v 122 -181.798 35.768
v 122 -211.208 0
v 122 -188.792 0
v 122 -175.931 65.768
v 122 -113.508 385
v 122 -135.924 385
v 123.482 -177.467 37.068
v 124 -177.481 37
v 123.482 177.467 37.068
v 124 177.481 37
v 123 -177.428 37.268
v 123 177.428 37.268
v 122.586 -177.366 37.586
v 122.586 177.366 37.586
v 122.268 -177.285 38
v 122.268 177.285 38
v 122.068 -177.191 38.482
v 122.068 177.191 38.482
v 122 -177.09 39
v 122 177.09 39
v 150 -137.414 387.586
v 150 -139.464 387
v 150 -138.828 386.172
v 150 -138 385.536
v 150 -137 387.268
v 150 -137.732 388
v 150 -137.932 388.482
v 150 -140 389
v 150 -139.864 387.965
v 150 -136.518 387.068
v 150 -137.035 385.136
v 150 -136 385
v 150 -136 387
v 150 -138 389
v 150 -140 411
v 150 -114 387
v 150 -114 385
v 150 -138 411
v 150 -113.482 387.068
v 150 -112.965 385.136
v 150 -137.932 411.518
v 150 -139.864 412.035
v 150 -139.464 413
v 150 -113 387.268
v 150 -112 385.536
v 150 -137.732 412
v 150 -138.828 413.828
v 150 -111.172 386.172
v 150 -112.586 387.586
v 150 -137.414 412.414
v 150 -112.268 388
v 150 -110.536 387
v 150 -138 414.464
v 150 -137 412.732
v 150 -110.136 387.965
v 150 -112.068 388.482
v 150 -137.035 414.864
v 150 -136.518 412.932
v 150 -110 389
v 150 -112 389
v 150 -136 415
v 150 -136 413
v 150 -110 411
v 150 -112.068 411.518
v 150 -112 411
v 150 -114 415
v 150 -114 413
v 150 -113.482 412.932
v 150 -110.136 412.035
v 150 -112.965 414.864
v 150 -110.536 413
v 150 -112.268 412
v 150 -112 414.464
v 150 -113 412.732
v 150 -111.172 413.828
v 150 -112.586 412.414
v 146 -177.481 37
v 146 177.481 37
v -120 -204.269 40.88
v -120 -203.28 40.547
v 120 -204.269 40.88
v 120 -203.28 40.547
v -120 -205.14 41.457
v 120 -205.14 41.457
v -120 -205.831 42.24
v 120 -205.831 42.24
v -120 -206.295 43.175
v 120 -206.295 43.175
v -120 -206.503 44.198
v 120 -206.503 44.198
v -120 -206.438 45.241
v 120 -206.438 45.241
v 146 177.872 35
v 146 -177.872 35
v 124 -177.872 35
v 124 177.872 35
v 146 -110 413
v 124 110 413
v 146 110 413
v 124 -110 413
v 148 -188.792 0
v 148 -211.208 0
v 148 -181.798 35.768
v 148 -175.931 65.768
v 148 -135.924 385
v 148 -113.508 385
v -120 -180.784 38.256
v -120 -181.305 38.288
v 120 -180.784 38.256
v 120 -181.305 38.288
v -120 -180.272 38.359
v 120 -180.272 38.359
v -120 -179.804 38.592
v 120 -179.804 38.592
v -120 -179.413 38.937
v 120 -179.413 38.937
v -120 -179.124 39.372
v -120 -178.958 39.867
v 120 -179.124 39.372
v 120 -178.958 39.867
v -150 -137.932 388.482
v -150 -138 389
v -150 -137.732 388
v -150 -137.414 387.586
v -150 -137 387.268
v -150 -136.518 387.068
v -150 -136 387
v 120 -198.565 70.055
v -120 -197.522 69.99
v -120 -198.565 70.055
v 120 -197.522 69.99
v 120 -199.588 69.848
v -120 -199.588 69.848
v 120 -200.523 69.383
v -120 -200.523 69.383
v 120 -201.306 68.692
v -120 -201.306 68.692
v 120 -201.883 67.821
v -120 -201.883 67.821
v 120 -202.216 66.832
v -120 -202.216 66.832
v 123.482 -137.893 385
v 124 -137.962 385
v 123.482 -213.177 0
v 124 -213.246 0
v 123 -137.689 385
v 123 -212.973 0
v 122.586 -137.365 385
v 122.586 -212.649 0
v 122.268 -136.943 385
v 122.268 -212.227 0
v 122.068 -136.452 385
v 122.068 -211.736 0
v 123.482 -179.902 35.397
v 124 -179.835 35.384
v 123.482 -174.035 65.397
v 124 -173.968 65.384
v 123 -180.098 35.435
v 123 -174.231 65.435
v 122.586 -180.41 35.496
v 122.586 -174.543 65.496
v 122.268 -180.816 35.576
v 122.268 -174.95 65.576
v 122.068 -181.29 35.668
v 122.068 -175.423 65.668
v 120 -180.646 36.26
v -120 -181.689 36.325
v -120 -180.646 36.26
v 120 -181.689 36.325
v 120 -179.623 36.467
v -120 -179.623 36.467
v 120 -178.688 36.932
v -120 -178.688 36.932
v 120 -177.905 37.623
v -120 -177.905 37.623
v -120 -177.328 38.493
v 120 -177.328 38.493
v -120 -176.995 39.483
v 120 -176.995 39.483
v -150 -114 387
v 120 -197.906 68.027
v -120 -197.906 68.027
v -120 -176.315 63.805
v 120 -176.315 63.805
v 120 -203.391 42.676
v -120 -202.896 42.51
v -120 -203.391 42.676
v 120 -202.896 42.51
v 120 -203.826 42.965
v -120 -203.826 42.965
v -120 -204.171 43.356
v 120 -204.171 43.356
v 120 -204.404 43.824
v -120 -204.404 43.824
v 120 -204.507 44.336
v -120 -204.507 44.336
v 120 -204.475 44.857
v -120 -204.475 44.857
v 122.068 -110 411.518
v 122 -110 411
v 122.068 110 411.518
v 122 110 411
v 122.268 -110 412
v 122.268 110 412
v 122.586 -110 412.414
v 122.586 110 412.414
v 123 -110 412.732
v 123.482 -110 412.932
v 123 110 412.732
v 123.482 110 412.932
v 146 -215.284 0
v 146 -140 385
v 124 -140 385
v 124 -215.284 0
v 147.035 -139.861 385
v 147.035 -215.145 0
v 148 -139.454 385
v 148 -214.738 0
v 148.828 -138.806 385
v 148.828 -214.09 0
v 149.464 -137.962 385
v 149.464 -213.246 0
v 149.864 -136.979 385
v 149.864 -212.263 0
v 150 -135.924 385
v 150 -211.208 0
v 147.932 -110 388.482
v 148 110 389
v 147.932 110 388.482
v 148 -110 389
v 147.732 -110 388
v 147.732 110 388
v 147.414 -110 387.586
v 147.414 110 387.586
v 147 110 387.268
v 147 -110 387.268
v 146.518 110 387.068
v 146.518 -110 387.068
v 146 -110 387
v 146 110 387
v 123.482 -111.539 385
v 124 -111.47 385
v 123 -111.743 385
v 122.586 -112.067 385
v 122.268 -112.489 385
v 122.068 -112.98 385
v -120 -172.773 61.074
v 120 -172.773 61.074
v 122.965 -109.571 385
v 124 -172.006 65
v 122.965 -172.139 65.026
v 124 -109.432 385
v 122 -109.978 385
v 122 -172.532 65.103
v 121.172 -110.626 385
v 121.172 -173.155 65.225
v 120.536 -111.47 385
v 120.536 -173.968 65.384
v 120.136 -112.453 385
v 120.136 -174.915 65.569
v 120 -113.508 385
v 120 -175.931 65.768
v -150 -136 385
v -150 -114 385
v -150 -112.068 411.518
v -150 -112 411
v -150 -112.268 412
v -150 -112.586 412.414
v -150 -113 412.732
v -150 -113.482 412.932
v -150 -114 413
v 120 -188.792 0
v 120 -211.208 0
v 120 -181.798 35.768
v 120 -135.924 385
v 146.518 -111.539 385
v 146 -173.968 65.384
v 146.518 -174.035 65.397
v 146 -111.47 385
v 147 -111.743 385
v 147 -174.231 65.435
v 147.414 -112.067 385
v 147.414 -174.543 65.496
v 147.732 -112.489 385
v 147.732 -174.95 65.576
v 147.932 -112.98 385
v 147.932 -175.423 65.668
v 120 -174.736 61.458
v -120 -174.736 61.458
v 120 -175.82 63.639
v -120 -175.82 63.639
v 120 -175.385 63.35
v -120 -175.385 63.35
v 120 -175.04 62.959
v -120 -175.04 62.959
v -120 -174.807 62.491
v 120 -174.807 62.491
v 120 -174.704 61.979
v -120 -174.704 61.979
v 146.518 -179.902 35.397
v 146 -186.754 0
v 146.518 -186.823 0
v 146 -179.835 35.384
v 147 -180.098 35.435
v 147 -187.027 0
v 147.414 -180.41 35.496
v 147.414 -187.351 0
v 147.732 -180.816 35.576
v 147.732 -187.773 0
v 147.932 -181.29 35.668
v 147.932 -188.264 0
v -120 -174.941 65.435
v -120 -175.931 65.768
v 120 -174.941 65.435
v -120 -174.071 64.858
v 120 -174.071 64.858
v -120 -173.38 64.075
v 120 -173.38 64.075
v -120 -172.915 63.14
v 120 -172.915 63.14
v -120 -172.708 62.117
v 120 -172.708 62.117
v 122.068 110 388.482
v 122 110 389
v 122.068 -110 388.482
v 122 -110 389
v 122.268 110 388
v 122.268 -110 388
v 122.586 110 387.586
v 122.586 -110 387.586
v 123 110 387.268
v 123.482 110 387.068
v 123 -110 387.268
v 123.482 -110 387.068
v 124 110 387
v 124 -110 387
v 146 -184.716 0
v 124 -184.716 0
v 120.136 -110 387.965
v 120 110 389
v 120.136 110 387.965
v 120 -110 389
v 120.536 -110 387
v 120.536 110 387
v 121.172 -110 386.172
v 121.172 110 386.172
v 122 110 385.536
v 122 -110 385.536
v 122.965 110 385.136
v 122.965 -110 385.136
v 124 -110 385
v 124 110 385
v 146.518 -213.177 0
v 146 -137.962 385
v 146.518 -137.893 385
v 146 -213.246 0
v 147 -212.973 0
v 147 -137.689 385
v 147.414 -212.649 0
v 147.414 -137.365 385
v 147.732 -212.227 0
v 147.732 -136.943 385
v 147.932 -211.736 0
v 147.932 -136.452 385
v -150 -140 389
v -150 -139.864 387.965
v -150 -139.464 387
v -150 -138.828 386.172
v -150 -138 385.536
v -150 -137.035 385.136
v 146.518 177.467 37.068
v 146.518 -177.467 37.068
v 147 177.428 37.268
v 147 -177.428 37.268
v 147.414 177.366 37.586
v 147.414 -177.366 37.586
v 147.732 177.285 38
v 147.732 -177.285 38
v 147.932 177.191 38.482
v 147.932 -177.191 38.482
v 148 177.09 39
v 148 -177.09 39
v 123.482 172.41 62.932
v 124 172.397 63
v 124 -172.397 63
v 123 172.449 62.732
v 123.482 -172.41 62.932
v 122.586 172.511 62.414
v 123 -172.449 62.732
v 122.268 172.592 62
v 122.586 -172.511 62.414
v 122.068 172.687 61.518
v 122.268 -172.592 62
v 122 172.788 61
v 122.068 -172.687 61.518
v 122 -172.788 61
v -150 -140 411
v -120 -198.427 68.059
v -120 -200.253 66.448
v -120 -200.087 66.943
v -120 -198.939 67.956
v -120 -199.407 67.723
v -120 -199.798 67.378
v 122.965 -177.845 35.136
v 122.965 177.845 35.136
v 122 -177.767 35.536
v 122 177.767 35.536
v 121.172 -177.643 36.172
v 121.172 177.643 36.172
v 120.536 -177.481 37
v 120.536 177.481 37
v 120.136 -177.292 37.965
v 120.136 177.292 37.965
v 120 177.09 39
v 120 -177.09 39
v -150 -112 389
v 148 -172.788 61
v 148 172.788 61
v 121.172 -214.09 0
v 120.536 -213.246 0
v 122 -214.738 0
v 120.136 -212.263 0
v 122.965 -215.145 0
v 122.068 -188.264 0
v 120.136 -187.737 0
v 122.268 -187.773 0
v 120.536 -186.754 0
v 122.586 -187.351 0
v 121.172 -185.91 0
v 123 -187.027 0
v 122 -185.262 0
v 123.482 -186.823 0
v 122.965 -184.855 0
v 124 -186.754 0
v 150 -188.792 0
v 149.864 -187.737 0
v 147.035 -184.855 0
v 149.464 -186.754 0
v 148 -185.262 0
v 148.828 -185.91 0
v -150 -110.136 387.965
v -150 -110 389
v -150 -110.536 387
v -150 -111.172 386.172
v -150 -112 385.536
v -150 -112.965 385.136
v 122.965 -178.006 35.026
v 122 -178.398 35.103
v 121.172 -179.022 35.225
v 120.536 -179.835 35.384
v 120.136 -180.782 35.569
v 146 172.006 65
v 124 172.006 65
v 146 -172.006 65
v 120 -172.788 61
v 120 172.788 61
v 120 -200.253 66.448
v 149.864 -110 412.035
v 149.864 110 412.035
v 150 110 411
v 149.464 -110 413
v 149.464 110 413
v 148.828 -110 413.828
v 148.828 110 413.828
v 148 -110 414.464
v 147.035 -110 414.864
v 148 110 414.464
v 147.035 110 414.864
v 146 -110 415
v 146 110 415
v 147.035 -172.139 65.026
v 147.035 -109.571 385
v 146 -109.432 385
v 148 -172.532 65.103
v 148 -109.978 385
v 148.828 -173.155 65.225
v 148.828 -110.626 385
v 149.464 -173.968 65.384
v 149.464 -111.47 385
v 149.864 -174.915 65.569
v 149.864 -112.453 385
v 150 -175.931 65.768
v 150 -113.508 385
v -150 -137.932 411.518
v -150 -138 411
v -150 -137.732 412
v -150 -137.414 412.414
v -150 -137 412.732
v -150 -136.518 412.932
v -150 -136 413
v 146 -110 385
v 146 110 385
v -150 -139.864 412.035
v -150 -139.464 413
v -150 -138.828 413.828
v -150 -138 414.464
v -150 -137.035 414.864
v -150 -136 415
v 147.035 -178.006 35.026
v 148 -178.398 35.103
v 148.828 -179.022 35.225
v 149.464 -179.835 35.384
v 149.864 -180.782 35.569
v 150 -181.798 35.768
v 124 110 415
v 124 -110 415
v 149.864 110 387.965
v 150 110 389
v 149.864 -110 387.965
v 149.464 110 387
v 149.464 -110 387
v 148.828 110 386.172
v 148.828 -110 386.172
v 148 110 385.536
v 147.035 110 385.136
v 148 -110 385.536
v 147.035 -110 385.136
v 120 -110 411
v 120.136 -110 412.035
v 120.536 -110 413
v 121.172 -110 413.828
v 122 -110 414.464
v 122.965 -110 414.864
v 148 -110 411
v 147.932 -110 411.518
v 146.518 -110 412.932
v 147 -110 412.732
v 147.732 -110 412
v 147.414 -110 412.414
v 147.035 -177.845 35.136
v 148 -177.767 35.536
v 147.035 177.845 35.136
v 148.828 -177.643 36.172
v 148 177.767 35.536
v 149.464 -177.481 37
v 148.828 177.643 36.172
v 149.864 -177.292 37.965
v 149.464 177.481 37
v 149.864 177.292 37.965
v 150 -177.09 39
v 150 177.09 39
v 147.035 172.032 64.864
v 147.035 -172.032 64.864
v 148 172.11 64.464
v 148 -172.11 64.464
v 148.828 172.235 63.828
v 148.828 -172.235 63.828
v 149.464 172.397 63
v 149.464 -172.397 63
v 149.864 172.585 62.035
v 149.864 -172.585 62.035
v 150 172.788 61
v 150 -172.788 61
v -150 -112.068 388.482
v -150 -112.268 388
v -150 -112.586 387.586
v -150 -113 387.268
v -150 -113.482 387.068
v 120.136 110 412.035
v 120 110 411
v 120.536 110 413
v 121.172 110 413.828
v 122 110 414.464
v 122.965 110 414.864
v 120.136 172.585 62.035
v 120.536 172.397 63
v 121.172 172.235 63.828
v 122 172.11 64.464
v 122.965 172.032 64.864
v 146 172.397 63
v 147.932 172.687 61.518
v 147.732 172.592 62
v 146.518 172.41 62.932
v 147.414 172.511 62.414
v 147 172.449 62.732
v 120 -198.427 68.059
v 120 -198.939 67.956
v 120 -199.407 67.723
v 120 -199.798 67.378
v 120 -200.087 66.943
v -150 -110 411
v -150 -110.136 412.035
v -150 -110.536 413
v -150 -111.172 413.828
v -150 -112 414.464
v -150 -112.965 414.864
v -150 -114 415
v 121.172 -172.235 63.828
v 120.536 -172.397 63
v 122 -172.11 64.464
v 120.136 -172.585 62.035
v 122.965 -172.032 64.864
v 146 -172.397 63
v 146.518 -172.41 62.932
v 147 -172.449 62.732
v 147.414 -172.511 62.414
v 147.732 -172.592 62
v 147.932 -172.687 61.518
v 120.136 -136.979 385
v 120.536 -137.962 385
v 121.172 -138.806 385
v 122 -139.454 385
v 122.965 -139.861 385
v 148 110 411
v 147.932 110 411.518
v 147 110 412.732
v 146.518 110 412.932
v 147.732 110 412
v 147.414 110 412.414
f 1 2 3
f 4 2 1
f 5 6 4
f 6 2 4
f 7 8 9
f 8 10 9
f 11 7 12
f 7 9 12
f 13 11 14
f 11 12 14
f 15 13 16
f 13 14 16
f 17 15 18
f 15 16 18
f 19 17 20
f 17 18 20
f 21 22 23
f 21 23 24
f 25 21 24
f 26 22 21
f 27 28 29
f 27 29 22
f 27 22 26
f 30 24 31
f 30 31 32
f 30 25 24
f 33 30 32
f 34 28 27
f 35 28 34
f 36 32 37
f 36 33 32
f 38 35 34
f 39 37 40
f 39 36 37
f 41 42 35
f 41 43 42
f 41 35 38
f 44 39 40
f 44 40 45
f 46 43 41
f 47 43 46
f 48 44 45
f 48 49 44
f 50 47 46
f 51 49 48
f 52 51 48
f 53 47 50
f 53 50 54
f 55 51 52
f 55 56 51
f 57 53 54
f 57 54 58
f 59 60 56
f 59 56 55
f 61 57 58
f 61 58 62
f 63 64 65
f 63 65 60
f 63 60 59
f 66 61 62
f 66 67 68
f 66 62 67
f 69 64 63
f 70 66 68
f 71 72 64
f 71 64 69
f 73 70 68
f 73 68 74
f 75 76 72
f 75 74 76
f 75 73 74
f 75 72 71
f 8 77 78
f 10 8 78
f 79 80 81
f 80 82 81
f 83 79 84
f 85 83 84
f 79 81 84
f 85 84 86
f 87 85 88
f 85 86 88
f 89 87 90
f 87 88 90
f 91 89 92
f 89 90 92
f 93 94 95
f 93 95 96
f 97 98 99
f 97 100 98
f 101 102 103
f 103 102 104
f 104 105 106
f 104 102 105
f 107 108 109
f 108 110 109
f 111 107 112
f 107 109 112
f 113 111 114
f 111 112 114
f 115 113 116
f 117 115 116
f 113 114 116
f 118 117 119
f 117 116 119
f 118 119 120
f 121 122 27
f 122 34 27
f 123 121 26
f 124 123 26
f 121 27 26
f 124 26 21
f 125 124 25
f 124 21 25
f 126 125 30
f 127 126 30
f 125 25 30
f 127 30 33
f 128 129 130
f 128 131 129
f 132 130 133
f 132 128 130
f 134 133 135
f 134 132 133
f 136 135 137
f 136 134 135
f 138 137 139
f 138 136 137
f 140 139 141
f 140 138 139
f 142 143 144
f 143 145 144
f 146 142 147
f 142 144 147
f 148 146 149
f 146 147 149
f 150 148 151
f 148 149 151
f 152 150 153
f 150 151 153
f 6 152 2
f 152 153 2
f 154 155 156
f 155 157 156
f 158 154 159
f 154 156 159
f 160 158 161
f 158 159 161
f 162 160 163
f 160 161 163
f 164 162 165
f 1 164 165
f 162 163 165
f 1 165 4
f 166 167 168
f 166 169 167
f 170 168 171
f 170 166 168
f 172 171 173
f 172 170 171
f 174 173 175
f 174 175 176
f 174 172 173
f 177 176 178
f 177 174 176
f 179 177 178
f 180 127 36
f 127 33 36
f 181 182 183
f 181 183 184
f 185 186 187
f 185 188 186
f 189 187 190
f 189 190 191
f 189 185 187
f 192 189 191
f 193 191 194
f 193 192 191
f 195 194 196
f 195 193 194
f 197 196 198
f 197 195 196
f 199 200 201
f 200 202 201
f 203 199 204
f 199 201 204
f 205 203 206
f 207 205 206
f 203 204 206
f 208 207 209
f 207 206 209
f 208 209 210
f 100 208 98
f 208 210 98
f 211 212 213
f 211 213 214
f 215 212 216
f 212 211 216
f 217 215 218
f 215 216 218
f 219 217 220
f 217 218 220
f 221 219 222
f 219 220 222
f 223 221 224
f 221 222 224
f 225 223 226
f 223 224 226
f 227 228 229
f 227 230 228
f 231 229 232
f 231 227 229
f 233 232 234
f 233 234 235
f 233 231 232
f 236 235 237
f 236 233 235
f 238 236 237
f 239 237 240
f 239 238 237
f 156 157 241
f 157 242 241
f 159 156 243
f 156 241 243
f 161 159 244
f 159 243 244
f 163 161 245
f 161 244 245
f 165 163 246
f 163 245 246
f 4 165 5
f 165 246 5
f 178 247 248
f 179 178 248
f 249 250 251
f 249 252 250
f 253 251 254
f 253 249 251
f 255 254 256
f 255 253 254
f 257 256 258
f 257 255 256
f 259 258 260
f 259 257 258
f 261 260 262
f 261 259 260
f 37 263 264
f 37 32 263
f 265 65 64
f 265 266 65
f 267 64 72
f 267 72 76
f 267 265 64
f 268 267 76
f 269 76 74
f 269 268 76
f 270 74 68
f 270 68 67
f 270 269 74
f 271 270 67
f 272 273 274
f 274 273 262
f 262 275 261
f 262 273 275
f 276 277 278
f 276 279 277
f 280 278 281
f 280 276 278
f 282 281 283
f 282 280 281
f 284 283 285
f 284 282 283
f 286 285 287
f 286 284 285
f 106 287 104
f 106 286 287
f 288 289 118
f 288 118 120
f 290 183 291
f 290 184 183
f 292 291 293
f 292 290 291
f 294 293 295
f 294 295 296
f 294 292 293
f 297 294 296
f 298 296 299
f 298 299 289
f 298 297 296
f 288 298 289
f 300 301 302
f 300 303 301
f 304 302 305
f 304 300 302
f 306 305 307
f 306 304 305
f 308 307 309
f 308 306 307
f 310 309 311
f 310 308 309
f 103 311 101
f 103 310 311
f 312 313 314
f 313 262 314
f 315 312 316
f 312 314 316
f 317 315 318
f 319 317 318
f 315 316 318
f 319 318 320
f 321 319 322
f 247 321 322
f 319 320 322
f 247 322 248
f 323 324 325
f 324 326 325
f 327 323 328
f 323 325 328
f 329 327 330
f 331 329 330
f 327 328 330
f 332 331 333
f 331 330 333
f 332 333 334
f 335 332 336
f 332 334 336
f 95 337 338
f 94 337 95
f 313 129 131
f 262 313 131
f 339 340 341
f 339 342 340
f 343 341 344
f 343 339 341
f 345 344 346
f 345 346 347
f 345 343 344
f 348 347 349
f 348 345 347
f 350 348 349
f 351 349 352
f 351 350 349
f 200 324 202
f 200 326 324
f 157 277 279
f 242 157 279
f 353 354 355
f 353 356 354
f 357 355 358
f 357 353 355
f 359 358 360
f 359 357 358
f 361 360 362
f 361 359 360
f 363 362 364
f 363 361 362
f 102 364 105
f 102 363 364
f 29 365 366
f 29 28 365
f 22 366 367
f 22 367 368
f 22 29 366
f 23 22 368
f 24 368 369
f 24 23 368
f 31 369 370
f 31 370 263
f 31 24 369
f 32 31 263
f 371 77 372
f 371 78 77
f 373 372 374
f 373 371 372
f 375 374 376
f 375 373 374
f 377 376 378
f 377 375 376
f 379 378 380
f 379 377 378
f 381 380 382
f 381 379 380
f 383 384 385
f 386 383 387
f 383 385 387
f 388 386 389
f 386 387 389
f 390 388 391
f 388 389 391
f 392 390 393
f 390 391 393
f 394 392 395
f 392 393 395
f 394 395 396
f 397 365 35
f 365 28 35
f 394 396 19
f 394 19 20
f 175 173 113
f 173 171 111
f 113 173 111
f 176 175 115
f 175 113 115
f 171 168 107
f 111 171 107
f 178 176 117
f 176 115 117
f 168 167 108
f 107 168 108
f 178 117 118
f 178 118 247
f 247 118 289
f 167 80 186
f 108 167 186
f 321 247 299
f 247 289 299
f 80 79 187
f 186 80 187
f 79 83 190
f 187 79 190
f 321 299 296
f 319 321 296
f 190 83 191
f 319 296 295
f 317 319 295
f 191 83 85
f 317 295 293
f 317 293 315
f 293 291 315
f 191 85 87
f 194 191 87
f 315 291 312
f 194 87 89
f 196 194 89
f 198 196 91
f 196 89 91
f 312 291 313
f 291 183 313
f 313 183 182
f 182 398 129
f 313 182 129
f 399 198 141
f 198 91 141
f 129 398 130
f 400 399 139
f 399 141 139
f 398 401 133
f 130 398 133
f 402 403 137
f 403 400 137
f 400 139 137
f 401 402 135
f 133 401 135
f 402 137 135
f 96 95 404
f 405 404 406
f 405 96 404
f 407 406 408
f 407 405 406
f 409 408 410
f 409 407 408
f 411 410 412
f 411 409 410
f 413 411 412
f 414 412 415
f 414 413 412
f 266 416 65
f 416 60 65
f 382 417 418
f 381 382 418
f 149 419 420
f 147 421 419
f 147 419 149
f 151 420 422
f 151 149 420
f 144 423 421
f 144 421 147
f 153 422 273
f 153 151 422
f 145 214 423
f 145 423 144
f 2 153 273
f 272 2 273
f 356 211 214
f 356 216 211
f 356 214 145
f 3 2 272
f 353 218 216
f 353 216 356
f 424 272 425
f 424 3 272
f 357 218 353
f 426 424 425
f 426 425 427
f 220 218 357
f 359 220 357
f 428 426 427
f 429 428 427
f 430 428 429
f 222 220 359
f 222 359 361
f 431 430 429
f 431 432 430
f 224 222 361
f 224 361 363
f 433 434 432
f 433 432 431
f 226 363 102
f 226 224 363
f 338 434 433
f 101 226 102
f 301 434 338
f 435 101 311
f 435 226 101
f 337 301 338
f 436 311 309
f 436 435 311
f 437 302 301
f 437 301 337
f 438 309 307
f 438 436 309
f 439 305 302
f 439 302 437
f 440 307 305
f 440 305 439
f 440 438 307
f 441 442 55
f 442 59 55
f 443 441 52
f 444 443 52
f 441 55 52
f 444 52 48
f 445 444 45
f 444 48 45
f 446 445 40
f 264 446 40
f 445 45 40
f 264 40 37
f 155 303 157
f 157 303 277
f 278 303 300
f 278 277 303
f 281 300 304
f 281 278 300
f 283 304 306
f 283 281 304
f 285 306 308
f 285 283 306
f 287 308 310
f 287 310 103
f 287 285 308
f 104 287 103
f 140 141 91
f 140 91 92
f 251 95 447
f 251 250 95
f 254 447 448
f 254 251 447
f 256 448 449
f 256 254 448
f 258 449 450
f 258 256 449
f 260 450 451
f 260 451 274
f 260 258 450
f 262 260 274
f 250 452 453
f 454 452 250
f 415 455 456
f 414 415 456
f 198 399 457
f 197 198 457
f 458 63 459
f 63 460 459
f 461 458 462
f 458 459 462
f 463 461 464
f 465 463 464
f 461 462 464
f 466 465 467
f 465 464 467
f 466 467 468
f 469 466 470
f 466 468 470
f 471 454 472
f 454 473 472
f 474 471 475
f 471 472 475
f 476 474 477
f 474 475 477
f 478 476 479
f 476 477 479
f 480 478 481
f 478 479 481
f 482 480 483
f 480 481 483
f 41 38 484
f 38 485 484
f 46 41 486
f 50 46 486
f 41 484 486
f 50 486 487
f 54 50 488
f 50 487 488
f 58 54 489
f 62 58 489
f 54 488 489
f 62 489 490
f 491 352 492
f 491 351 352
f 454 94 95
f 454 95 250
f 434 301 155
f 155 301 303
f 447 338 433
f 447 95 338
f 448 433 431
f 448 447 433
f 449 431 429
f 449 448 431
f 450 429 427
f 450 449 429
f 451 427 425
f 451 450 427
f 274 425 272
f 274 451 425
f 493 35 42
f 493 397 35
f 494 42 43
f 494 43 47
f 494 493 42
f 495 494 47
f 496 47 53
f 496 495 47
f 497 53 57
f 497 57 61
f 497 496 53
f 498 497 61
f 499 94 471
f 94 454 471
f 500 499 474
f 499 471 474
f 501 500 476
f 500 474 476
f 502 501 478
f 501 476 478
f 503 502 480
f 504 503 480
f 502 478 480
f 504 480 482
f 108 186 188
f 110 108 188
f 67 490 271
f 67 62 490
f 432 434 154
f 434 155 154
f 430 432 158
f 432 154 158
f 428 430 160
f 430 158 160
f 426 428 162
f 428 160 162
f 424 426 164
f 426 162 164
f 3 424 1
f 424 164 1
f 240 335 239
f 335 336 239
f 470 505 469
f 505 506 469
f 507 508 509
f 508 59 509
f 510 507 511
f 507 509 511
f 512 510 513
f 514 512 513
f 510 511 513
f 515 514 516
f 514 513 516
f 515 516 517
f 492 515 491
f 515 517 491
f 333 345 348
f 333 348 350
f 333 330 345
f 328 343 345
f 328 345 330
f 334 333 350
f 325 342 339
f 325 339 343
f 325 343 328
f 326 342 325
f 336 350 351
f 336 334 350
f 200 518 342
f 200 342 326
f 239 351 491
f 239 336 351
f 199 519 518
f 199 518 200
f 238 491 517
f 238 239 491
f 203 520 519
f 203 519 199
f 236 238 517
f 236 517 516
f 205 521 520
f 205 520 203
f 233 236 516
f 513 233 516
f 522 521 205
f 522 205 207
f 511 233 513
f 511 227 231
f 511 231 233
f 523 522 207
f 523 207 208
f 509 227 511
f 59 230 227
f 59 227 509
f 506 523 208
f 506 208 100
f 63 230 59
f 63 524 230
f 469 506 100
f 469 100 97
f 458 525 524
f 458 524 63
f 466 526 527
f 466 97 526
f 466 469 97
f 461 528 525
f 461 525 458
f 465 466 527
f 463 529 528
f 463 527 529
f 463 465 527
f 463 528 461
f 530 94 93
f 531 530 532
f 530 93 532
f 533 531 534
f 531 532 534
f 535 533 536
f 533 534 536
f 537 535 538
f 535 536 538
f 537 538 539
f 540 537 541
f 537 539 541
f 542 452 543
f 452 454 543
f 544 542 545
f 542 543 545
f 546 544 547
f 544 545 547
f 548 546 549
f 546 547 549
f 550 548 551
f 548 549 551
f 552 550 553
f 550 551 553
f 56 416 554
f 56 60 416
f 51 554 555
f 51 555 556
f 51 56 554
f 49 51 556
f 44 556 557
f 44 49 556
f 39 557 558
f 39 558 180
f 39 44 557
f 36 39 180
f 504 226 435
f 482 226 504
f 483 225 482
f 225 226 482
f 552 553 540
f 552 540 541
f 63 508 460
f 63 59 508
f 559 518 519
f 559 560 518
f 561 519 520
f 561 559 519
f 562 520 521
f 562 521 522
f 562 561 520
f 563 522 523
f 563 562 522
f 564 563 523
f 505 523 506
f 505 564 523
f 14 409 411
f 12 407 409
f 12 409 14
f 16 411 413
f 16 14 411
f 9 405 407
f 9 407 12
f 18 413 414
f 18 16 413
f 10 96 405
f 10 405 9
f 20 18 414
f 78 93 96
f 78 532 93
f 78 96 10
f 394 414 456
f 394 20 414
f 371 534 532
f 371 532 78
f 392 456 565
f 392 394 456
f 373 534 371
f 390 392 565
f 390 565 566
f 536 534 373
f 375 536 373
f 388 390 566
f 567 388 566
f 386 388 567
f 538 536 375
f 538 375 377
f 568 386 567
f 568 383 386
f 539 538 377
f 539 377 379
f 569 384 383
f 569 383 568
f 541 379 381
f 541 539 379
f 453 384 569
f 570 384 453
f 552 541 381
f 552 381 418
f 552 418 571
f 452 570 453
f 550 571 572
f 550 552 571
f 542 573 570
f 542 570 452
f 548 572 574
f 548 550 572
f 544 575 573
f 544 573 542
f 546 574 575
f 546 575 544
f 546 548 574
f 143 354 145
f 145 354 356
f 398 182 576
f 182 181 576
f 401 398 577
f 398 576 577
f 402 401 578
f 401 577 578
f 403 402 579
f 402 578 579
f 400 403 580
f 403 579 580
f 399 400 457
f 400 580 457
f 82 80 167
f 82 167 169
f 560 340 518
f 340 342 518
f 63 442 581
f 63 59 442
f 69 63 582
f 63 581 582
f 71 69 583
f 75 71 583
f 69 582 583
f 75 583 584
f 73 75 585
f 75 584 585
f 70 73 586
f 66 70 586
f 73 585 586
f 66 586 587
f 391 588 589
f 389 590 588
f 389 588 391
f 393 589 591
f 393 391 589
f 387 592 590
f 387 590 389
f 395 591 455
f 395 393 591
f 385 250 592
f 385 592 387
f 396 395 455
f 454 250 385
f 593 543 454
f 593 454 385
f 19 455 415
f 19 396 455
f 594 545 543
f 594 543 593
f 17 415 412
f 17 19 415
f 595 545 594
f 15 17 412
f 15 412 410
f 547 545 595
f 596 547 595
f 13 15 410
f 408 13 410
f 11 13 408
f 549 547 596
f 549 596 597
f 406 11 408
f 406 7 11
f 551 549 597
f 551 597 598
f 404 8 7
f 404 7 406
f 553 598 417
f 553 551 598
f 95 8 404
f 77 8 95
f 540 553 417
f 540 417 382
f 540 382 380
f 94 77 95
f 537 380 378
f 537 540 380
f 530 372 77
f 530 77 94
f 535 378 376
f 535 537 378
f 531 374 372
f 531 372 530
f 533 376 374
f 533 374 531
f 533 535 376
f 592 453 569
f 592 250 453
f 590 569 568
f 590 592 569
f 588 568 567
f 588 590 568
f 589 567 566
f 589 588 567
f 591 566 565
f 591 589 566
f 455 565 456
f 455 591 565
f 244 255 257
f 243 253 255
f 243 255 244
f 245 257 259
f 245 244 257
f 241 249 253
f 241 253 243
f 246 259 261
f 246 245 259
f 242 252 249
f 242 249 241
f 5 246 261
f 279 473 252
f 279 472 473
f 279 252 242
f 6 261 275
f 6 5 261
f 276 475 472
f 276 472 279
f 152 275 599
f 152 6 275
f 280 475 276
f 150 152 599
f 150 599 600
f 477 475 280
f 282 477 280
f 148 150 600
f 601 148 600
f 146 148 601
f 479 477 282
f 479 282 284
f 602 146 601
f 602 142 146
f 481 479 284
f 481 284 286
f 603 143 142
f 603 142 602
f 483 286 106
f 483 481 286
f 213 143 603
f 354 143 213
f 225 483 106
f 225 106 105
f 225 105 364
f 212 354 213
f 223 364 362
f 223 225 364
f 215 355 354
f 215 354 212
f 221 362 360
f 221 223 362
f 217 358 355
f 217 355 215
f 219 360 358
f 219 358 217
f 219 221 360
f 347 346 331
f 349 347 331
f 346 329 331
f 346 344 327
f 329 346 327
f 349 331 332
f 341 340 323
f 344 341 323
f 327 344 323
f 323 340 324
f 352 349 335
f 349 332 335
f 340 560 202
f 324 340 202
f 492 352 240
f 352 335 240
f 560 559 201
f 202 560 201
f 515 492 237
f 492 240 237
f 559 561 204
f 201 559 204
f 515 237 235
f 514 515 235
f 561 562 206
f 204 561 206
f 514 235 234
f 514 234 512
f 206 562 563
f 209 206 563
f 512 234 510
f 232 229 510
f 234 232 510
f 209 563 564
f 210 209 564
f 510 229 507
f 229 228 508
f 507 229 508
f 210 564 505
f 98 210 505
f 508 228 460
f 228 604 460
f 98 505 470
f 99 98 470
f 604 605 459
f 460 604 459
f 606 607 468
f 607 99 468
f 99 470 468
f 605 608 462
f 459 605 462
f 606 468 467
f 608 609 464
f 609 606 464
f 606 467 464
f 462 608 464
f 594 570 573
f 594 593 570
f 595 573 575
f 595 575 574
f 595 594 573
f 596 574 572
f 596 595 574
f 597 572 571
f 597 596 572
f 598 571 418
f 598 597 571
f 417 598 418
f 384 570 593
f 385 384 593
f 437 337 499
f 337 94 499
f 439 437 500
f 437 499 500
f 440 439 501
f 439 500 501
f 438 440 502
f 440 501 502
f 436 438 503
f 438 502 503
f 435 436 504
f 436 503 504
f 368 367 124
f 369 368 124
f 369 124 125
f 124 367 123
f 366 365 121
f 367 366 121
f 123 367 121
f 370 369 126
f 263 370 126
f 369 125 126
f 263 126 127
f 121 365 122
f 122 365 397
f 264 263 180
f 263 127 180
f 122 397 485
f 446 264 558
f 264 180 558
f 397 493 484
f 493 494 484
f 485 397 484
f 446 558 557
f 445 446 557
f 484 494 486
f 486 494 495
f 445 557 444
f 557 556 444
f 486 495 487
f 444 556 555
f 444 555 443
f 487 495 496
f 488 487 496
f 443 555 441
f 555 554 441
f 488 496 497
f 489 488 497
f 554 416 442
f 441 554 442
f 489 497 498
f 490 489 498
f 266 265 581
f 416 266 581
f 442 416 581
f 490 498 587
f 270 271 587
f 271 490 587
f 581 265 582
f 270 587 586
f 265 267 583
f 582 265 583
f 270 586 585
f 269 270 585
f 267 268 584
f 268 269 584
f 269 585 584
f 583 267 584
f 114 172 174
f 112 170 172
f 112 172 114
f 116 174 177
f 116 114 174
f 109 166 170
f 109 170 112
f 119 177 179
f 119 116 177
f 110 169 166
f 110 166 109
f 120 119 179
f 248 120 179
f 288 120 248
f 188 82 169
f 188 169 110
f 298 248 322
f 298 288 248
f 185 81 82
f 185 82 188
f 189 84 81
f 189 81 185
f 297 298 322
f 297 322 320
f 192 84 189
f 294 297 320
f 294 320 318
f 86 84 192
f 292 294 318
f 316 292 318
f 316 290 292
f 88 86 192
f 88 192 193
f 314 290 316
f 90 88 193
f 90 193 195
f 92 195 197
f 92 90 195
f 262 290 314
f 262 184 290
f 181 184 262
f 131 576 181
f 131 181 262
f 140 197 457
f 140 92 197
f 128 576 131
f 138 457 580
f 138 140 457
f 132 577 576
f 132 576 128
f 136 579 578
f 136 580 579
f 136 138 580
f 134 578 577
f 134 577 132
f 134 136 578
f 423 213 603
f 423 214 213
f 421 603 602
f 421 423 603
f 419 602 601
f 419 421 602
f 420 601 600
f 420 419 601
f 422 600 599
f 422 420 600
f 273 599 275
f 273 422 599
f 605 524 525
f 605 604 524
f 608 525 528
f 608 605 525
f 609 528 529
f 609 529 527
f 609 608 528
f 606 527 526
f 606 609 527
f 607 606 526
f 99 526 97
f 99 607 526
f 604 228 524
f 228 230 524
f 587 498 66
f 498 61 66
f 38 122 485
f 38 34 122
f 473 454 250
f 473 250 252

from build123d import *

# Parameters (mm, degrees)
F3_W      = 30
F3_H      = 30
F4_DEPTH  = 150
F5_R      = 4
F6_T      = -2
F7_W      = 30
F7_H      = 30
F8_DEPTH  = 110
F9_R      = 4
F10_T     = -2
F12_DEPTH = 30
F13_R     = 4
F14_T     = -2
F15_DEPTH = 30
F16_R     = 4
F17_T     = -2
F18_W     = 240
F18_H     = 30
F19_DEPTH = 30
F20_R     = 4
F21_T     = -2


with BuildPart() as f4:
    # F3 (on Right) → F4 (new body, symmetric)
    with BuildSketch(Plane.YZ):
        with Locations((-125, 400)):
            Rectangle(F3_W, F3_H)
    extrude(amount=F4_DEPTH, both=True)

    # F5
    f5_edges = [f4.edges().sort_by_distance(p)[0] for p in [
        (0, -140, 415),
        (0, -110, 415),
        (0, -140, 385),
        (0, -110, 385),
    ]]
    fillet(f5_edges, radius=F5_R)

    # F6
    f6_openings = [f4.faces().sort_by_distance(p)[0] for p in [
        (150, -125, 400),
        (-150, -125, 400),
    ]]
    offset(amount=F6_T, openings=f6_openings)


with BuildPart() as f8:
    # F7 (on Front) → F8 (new body, symmetric)
    with BuildSketch(Plane.XZ):
        with Locations((135, 400)):
            Rectangle(F7_W, F7_H)
    extrude(amount=F8_DEPTH, both=True)

    # F9
    f9_edges = [f8.edges().sort_by_distance(p)[0] for p in [
        (150, 0, 415),
        (120, 0, 415),
        (150, 0, 385),
        (120, 0, 385),
    ]]
    fillet(f9_edges, radius=F9_R)

    # F10
    f10_openings = [f8.faces().sort_by_distance(p)[0] for p in [
        (135, 110, 400),
        (135, -110, 400),
    ]]
    offset(amount=F10_T, openings=f10_openings)


with BuildPart() as f12:
    # F11 (on face) → F12 (new body)
    with BuildSketch(Plane.YZ.offset(150)):
        Polygon((-109.4318239247, 385), (-140, 385), (-215.2840880376, 0), (-184.7159119624, 0), (-177.8719039589, 35), (-172.0056113846, 65), align=None)
    extrude(amount=-F12_DEPTH)

    # F13
    f13_edges = [f12.edges().sort_by_distance(p)[0] for p in [
        (150, -177.642044, 192.5),
        (150, -147.073868, 192.5),
        (120, -177.642044, 192.5),
        (120, -147.073868, 192.5),
    ]]
    fillet(f13_edges, radius=F13_R)

    # F14
    f14_openings = [f12.faces().sort_by_distance(p)[0] for p in [
        (135, -124.715912, 385),
        (135, -200, 0),
    ]]
    offset(amount=F14_T, openings=f14_openings)


with BuildPart() as f15:
    # F11 (on face) → F15 (new body)
    with BuildSketch(Plane.YZ.offset(150)):
        Polygon((172.0056113846, 65), (-172.0056113846, 65), (-177.8719039589, 35), (177.871903959, 35), align=None)
    extrude(amount=-F15_DEPTH)

    # F16
    f16_edges = [f15.edges().sort_by_distance(p)[0] for p in [
        (150, 0, 65),
        (120, 0, 65),
        (150, 0, 35),
        (120, 0, 35),
    ]]
    fillet(f16_edges, radius=F16_R)

    # F17
    f17_openings = [f15.faces().sort_by_distance(p)[0] for p in [
        (135, -174.938758, 50),
        (135, 174.938758, 50),
    ]]
    offset(amount=F17_T, openings=f17_openings)


with BuildPart() as f19:
    # F18 (on face) → F19 (new body)
    with BuildSketch(Plane(origin=(0, -207.355418495, 40.5469183924), x_dir=(1, 0, 0), z_dir=(0, -0.9814128238, 0.191908492))):
        with Locations((0, 15.7824960465)):
            Rectangle(F18_W, F18_H)
    extrude(amount=-F19_DEPTH)

    # F20
    f20_edges = [f19.edges().sort_by_distance(p)[0] for p in [
        (0, -201.447996, 70.757255),
        (0, -207.205251, 41.31487),
        (0, -177.762866, 35.557615),
        (0, -172.005611, 65),
    ]]
    fillet(f20_edges, radius=F20_R)

    # F21
    f21_openings = [f19.faces().sort_by_distance(p)[0] for p in [
        (-120, -189.605431, 53.157435),
        (120, -189.605431, 53.157435),
    ]]
    offset(amount=F21_T, openings=f21_openings)


solid = Compound([f4.part, f8.part, f12.part, f15.part, f19.part])
